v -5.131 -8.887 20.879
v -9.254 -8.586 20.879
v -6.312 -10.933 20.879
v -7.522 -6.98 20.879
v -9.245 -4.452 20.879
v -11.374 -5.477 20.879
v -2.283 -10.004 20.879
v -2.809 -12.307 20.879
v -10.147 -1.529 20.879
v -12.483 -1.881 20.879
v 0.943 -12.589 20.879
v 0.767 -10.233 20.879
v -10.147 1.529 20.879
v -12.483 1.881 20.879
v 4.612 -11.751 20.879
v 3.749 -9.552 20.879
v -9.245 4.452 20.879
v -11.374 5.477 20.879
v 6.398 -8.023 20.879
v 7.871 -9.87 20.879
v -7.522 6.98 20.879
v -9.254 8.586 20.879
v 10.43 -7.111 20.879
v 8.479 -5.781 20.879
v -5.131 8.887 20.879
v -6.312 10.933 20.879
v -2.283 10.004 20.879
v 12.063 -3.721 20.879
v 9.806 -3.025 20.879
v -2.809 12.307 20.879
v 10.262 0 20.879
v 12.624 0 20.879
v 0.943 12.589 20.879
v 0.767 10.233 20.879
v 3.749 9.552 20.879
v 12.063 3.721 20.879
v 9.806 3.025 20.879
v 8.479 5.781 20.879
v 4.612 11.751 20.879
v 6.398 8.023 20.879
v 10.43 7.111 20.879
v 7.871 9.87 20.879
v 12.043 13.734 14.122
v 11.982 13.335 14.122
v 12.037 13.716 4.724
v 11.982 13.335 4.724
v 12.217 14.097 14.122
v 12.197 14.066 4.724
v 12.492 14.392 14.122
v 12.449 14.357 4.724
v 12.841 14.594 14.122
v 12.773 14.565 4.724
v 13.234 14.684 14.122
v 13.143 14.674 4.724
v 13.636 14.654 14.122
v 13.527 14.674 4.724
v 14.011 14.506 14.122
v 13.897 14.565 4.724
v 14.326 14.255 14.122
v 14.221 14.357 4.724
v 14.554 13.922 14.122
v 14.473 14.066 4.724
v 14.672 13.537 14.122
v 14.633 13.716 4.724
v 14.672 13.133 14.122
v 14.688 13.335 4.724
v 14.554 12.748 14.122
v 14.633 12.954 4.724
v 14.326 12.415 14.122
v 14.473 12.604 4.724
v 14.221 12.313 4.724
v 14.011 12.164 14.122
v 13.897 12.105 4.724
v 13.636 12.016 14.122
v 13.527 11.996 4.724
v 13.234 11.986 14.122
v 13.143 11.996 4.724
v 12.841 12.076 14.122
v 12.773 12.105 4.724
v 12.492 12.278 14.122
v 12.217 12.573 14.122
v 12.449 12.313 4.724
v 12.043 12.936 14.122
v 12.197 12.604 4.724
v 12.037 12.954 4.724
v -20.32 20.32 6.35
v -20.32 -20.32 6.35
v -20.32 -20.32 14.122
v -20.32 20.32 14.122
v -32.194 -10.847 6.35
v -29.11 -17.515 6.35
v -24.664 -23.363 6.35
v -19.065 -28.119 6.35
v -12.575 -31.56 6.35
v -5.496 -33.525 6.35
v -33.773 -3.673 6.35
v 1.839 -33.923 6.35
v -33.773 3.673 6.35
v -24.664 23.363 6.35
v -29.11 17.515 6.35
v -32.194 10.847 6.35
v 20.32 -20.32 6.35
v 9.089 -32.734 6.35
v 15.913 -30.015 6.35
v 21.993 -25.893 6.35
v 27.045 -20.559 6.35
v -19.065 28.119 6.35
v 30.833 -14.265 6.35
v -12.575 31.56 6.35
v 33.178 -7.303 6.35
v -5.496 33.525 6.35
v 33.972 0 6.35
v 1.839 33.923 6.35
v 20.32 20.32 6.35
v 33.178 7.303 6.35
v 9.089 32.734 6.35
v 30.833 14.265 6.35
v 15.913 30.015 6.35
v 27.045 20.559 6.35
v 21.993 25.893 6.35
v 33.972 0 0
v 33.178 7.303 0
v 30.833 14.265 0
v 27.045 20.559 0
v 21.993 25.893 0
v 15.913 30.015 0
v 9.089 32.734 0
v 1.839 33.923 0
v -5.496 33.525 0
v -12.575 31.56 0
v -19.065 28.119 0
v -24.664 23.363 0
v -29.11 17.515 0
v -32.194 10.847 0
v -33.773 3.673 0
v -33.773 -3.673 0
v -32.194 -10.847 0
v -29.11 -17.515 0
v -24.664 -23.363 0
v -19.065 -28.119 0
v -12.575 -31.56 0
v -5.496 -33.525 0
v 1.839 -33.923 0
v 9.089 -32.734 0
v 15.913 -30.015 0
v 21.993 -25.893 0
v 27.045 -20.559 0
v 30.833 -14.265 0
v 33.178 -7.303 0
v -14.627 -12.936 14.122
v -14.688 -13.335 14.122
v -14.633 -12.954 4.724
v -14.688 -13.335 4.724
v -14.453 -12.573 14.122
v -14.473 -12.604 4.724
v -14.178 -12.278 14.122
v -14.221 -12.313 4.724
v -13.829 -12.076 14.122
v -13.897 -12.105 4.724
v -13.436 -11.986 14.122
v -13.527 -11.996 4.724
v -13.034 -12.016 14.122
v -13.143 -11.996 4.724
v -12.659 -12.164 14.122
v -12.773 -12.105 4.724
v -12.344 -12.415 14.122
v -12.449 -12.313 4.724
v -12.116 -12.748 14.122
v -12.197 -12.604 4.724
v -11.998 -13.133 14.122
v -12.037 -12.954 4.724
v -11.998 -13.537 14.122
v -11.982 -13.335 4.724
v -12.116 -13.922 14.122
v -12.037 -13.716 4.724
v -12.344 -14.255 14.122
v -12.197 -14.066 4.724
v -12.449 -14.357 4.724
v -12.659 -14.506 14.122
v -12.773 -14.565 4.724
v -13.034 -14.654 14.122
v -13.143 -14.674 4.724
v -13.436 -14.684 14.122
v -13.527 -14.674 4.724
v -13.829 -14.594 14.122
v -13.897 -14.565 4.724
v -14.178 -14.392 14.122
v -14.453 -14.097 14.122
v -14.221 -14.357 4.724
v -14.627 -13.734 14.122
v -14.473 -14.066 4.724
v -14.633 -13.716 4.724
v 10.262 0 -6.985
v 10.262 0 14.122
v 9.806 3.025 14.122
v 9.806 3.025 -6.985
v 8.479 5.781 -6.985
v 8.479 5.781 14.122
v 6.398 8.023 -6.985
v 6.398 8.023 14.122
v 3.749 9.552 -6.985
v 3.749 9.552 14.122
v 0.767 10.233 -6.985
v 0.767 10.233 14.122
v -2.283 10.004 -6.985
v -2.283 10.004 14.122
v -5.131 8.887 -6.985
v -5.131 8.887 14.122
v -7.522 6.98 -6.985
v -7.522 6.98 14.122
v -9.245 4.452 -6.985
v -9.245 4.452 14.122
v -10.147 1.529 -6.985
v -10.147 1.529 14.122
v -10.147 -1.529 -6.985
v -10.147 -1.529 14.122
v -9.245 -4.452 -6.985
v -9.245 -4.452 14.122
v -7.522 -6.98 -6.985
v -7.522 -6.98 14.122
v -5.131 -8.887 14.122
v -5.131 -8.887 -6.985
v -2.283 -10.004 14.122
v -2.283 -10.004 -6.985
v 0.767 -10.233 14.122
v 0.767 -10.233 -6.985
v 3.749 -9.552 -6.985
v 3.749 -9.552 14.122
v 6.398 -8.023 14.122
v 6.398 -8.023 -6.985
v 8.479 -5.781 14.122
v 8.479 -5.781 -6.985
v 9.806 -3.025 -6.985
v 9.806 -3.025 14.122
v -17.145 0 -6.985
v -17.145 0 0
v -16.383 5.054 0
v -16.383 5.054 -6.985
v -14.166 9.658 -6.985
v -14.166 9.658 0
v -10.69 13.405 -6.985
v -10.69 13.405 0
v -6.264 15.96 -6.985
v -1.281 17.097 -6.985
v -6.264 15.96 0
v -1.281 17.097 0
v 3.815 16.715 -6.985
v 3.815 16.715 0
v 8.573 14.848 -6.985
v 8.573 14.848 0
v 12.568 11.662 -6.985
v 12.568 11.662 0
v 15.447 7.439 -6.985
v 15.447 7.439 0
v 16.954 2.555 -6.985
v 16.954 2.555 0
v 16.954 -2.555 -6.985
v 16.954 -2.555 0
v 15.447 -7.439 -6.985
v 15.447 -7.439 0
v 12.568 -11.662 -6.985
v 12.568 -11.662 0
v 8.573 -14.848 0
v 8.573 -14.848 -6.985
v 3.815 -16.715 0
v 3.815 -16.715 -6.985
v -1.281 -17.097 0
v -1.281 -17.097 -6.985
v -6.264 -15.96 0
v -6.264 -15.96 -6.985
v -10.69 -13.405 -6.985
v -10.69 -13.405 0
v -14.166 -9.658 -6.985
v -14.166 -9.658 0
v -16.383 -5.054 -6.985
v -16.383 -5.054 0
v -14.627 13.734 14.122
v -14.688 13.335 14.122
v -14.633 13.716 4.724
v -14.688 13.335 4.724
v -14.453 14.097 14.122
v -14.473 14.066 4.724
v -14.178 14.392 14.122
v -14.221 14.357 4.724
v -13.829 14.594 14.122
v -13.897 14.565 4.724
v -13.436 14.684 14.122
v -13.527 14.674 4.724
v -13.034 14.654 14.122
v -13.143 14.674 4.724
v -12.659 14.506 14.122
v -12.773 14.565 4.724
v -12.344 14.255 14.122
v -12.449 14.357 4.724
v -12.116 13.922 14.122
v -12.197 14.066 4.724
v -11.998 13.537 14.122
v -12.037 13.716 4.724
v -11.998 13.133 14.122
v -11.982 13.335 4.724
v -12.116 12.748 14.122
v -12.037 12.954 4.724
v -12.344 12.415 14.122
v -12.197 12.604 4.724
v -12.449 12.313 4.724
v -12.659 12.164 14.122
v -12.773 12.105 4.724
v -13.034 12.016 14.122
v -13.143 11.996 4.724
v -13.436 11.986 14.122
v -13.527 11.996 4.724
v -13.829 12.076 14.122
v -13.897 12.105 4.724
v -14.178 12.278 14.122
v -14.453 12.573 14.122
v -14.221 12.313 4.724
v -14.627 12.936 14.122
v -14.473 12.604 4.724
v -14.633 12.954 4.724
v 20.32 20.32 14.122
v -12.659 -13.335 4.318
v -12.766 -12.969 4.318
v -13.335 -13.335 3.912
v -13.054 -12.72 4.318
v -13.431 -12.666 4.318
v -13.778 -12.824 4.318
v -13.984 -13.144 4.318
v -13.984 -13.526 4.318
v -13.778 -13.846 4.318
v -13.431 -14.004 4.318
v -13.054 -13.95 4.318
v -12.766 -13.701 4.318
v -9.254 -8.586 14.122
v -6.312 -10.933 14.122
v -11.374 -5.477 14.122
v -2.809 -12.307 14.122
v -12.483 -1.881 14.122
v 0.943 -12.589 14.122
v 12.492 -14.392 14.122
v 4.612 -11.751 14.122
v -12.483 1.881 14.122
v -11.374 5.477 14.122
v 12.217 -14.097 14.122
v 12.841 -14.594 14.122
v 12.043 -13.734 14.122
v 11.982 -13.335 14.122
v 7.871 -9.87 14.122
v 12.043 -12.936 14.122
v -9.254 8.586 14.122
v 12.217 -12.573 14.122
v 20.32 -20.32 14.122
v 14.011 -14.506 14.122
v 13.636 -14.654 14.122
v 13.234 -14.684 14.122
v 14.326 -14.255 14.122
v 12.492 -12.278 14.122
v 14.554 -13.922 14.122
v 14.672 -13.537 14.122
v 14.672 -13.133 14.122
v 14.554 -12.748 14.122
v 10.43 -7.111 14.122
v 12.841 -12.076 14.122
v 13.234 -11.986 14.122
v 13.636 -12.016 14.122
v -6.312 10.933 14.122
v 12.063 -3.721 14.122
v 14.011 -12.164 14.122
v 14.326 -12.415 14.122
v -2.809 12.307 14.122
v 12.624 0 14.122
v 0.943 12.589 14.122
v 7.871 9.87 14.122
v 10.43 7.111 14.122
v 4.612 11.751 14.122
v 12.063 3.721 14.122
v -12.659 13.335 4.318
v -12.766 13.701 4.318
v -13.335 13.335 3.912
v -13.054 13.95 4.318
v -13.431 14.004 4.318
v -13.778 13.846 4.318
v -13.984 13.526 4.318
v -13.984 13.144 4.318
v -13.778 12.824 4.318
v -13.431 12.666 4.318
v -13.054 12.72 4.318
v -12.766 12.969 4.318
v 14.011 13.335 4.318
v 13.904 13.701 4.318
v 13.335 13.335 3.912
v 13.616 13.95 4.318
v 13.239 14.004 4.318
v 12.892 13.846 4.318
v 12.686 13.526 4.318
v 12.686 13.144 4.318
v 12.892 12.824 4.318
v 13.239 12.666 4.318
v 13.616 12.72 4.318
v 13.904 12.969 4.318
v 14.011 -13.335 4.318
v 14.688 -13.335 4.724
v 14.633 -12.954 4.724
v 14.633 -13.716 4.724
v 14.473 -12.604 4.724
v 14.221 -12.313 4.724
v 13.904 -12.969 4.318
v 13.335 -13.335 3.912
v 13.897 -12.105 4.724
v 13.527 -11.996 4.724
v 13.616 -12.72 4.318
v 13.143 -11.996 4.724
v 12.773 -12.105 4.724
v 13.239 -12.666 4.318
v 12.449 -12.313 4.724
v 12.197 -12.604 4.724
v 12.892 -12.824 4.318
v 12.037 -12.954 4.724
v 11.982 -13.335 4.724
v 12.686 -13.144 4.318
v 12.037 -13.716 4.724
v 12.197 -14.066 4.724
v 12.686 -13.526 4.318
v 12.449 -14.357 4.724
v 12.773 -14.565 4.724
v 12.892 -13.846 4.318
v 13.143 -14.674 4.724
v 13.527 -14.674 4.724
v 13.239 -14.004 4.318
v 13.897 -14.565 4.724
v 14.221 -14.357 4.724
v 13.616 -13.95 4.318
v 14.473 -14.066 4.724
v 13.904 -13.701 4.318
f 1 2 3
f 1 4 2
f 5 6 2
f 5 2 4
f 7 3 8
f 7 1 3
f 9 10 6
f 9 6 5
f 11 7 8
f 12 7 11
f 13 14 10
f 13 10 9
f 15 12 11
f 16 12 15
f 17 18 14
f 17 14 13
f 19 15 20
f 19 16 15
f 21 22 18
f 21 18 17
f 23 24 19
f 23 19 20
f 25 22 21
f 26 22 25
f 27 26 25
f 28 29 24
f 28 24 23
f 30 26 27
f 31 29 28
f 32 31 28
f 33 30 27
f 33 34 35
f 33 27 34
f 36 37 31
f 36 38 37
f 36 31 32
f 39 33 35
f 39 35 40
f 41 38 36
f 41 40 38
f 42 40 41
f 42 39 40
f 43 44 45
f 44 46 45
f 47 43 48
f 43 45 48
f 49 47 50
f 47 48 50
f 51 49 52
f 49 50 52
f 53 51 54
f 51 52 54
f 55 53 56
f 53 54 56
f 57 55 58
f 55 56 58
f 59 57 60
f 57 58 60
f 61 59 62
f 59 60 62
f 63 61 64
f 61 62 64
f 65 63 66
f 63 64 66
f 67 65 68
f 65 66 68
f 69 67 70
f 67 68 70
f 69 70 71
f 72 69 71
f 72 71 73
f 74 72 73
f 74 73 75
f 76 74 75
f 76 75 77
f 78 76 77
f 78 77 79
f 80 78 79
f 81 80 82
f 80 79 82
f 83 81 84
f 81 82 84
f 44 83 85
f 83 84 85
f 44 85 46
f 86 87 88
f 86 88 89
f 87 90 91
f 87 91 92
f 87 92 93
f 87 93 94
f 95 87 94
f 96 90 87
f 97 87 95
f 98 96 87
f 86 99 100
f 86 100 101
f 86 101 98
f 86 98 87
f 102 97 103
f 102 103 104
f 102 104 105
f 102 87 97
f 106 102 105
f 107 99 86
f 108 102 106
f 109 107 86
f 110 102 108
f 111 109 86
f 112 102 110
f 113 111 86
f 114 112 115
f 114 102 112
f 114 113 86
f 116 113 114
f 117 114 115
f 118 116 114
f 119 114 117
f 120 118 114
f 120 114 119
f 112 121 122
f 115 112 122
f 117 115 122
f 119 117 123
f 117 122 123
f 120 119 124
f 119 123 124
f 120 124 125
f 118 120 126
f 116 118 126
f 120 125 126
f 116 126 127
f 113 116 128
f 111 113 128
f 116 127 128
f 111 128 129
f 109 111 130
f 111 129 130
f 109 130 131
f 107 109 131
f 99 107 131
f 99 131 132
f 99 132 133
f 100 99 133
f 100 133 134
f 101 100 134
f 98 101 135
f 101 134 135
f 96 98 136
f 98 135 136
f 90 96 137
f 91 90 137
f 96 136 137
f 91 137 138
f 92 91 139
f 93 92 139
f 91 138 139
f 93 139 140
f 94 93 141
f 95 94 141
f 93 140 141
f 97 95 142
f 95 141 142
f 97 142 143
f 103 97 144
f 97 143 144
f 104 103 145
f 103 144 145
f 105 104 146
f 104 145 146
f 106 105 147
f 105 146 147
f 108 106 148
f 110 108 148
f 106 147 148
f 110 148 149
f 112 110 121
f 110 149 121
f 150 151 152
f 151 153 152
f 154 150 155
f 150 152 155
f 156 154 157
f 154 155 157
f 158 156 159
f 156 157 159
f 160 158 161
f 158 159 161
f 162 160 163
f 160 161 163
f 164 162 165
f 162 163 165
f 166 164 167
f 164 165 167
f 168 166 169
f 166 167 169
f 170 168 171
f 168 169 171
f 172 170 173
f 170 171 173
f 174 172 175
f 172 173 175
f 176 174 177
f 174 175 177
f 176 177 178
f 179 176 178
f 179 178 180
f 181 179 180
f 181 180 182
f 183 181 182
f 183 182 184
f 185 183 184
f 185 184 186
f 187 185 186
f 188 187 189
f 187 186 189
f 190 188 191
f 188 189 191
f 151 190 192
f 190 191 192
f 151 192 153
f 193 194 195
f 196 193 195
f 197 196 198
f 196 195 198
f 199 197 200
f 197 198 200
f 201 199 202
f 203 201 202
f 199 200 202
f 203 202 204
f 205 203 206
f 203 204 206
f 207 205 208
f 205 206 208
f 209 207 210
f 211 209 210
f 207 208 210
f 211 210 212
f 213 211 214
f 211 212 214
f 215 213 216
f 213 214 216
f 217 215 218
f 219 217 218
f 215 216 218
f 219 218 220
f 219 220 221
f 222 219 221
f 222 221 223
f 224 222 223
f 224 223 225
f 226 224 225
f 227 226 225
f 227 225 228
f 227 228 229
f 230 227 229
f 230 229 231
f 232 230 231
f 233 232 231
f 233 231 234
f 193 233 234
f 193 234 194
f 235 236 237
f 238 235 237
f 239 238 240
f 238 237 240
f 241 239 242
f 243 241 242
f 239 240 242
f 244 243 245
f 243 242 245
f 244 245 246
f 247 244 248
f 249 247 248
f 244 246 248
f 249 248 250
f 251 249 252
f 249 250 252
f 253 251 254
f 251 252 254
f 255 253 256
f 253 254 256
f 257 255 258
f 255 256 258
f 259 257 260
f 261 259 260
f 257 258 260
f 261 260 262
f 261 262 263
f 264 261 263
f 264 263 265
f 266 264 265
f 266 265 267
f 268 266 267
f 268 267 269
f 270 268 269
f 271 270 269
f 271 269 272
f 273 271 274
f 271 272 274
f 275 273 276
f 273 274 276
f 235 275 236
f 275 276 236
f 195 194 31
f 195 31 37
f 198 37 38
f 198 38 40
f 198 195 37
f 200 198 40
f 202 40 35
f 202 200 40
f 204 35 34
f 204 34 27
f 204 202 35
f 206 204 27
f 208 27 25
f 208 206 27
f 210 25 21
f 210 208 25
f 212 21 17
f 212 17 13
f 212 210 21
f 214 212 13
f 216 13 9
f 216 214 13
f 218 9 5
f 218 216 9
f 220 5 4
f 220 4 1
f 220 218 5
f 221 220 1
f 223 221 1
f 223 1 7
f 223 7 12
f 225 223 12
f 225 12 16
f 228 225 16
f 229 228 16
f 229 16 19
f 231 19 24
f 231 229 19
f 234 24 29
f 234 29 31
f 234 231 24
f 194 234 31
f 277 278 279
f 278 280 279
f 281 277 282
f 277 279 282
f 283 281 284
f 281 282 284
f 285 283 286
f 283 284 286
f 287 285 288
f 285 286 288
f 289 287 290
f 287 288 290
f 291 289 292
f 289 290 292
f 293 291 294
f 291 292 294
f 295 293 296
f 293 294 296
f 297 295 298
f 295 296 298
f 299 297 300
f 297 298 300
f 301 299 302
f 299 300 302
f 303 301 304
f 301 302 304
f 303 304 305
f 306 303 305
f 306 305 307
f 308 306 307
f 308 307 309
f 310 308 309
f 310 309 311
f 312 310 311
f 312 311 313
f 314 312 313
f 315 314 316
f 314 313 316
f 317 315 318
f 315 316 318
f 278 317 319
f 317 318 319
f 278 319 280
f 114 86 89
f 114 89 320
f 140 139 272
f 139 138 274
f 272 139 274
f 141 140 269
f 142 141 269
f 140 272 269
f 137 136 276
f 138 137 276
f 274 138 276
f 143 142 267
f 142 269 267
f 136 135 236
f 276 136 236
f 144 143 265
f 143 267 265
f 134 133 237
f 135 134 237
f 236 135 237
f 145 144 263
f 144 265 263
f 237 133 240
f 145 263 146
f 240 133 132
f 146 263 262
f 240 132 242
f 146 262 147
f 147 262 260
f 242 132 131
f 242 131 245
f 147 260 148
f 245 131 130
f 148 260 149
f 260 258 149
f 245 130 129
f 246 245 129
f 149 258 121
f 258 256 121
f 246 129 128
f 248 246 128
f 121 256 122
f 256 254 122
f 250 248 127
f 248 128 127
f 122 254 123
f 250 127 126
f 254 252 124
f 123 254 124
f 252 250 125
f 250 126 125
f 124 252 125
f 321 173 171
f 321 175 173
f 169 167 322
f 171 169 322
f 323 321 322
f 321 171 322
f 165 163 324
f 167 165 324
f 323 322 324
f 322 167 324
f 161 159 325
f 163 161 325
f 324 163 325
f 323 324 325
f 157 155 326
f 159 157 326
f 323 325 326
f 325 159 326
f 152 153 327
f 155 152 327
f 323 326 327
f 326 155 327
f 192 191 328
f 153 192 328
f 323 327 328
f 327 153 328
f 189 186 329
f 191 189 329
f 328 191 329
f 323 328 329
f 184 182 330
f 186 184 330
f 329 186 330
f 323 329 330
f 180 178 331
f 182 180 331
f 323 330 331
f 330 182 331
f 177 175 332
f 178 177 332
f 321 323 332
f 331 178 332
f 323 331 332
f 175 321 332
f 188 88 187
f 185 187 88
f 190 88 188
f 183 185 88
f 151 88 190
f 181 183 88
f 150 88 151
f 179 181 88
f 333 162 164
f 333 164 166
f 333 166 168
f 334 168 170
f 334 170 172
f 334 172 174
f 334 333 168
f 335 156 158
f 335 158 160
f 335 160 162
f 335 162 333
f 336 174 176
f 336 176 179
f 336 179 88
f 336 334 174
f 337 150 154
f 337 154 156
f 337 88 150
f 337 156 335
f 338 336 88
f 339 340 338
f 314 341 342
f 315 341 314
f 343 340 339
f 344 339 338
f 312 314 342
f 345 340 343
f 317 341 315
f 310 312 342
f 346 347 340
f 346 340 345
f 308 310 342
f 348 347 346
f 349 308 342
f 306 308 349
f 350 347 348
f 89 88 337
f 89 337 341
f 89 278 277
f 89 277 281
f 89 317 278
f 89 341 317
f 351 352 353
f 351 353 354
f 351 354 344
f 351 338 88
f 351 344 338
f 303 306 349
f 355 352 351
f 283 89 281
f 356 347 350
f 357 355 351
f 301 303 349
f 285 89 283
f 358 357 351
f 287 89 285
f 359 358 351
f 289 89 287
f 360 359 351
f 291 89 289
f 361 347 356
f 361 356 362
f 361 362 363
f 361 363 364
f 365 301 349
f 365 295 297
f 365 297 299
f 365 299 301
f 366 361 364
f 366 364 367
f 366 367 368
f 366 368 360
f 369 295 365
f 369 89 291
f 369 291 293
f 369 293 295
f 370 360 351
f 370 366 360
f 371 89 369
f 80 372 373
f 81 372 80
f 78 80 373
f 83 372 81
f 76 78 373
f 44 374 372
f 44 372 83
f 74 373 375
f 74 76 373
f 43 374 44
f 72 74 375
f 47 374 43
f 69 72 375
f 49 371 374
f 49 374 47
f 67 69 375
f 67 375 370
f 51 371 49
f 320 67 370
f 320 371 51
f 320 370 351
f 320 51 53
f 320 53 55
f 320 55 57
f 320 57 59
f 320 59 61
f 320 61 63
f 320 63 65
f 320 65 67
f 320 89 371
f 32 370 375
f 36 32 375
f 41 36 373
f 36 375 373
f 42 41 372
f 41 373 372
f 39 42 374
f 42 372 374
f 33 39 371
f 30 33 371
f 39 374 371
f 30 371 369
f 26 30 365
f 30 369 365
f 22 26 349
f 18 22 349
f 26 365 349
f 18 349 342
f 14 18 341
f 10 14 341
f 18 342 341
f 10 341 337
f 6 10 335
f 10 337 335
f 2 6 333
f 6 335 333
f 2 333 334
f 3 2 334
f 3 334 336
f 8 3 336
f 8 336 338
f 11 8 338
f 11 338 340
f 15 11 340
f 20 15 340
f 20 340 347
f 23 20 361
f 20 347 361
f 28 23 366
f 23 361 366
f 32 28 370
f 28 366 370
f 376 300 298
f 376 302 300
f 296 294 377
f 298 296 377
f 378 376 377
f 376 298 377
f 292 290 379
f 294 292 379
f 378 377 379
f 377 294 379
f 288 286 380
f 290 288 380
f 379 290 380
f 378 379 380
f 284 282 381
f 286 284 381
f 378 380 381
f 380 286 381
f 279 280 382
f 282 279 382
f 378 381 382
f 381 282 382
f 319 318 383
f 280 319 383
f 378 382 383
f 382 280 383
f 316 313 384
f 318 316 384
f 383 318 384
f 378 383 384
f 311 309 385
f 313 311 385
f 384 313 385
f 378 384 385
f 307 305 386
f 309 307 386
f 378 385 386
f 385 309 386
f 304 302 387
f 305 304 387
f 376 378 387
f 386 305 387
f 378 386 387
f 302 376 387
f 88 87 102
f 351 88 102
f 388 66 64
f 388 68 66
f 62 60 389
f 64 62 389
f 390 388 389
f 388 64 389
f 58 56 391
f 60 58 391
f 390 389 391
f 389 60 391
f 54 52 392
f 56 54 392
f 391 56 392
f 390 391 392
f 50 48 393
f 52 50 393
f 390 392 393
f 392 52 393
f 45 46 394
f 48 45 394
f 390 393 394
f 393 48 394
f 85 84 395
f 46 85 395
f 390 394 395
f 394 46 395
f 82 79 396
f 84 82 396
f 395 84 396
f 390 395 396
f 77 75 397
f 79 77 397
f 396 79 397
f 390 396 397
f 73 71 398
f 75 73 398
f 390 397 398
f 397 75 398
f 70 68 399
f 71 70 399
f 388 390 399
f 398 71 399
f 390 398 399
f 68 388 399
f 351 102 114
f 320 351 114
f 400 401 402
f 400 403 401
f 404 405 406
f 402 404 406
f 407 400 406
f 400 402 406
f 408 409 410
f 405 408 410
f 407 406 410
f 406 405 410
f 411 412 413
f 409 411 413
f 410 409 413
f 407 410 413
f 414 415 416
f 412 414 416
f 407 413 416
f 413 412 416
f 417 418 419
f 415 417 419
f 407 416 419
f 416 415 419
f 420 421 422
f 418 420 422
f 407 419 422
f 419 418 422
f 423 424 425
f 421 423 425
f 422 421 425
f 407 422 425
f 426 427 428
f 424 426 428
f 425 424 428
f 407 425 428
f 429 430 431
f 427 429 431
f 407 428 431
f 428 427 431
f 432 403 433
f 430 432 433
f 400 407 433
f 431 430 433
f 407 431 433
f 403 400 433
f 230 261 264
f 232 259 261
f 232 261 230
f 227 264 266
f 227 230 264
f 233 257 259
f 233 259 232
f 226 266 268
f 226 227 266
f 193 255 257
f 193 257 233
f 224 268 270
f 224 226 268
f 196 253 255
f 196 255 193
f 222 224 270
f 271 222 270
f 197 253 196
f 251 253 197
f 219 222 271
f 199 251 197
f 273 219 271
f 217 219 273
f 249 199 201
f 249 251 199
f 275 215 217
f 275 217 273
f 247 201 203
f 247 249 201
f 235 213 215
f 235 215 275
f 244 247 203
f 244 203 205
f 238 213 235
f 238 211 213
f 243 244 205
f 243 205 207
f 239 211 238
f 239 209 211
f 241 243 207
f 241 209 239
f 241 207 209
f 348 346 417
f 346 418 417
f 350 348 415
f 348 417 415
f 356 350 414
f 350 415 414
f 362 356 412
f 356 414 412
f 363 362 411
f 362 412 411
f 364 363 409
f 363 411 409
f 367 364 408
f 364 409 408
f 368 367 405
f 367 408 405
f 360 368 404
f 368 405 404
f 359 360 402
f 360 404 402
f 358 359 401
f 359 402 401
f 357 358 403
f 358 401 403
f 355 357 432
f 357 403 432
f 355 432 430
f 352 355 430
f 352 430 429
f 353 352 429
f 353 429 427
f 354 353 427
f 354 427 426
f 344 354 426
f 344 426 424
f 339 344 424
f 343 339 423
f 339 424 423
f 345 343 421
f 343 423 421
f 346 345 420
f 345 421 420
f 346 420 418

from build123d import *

# Parameters (mm, degrees)
SKETCH1_R                 = 33.9725
BOSS_EXTRUDE2_DEPTH       = 6.35
SKETCH2_R                 = 17.145
BOSS_EXTRUDE3_DEPTH       = 6.985
SKETCH3_W                 = 40.64
SKETCH3_H                 = 40.64
BOSS_EXTRUDE4_DEPTH       = 7.7724
SKETCH4_R                 = 10.2616
CUT_EXTRUDE1_DEPTH        = 22.1074
F_6_32_TAPPED_HOLE1_D     = 2.7051
F_6_32_TAPPED_HOLE1_DEPTH = 9.398
F_6_32_TAPPED_HOLE1_TIP   = 0.81269403
SKETCH8_R                 = 12.6238
SKETCH8_R_2               = 10.2616
BOSS_EXTRUDE5_DEPTH       = 6.7564


with BuildPart() as part:
    # Sketch1 → Boss-Extrude2 (new body)
    with BuildSketch(Plane.XY):
        Circle(SKETCH1_R)
    extrude(amount=BOSS_EXTRUDE2_DEPTH)

    # Sketch2 → Boss-Extrude3 (add)
    with BuildSketch(Plane(origin=(0, 0, 0), x_dir=(-1, 0, 0), z_dir=(0, 0, -1))):
        Circle(SKETCH2_R)
    extrude(amount=BOSS_EXTRUDE3_DEPTH)

    # Sketch3 → Boss-Extrude4 (add)
    with BuildSketch(Plane.XY.offset(6.35)):
        Rectangle(SKETCH3_W, SKETCH3_H)
    extrude(amount=BOSS_EXTRUDE4_DEPTH)

    # Sketch4 → Cut-Extrude1 (cut, through all)
    with BuildSketch(Plane.XY.offset(14.1224)):
        Circle(SKETCH4_R)
    extrude(amount=-CUT_EXTRUDE1_DEPTH, mode=Mode.SUBTRACT)

    # #6-32 Tapped Hole1
    with Locations(Plane.XY.offset(14.1224)):
        with Locations((-13.335, 13.335), (13.335, 13.335), (13.335, -13.335), (-13.335, -13.335)):
            Hole(F_6_32_TAPPED_HOLE1_D / 2, depth=F_6_32_TAPPED_HOLE1_DEPTH)
            with Locations((0, 0, -(F_6_32_TAPPED_HOLE1_DEPTH + F_6_32_TAPPED_HOLE1_TIP / 2))):  # 118° drill point
                Cone(0, F_6_32_TAPPED_HOLE1_D / 2, F_6_32_TAPPED_HOLE1_TIP, mode=Mode.SUBTRACT)

    # Sketch8 → Boss-Extrude5 (add)
    with BuildSketch(Plane.XY.offset(14.1224)):
        Circle(SKETCH8_R)
        Circle(SKETCH8_R_2, mode=Mode.SUBTRACT)
    extrude(amount=BOSS_EXTRUDE5_DEPTH)


solid = part.part
